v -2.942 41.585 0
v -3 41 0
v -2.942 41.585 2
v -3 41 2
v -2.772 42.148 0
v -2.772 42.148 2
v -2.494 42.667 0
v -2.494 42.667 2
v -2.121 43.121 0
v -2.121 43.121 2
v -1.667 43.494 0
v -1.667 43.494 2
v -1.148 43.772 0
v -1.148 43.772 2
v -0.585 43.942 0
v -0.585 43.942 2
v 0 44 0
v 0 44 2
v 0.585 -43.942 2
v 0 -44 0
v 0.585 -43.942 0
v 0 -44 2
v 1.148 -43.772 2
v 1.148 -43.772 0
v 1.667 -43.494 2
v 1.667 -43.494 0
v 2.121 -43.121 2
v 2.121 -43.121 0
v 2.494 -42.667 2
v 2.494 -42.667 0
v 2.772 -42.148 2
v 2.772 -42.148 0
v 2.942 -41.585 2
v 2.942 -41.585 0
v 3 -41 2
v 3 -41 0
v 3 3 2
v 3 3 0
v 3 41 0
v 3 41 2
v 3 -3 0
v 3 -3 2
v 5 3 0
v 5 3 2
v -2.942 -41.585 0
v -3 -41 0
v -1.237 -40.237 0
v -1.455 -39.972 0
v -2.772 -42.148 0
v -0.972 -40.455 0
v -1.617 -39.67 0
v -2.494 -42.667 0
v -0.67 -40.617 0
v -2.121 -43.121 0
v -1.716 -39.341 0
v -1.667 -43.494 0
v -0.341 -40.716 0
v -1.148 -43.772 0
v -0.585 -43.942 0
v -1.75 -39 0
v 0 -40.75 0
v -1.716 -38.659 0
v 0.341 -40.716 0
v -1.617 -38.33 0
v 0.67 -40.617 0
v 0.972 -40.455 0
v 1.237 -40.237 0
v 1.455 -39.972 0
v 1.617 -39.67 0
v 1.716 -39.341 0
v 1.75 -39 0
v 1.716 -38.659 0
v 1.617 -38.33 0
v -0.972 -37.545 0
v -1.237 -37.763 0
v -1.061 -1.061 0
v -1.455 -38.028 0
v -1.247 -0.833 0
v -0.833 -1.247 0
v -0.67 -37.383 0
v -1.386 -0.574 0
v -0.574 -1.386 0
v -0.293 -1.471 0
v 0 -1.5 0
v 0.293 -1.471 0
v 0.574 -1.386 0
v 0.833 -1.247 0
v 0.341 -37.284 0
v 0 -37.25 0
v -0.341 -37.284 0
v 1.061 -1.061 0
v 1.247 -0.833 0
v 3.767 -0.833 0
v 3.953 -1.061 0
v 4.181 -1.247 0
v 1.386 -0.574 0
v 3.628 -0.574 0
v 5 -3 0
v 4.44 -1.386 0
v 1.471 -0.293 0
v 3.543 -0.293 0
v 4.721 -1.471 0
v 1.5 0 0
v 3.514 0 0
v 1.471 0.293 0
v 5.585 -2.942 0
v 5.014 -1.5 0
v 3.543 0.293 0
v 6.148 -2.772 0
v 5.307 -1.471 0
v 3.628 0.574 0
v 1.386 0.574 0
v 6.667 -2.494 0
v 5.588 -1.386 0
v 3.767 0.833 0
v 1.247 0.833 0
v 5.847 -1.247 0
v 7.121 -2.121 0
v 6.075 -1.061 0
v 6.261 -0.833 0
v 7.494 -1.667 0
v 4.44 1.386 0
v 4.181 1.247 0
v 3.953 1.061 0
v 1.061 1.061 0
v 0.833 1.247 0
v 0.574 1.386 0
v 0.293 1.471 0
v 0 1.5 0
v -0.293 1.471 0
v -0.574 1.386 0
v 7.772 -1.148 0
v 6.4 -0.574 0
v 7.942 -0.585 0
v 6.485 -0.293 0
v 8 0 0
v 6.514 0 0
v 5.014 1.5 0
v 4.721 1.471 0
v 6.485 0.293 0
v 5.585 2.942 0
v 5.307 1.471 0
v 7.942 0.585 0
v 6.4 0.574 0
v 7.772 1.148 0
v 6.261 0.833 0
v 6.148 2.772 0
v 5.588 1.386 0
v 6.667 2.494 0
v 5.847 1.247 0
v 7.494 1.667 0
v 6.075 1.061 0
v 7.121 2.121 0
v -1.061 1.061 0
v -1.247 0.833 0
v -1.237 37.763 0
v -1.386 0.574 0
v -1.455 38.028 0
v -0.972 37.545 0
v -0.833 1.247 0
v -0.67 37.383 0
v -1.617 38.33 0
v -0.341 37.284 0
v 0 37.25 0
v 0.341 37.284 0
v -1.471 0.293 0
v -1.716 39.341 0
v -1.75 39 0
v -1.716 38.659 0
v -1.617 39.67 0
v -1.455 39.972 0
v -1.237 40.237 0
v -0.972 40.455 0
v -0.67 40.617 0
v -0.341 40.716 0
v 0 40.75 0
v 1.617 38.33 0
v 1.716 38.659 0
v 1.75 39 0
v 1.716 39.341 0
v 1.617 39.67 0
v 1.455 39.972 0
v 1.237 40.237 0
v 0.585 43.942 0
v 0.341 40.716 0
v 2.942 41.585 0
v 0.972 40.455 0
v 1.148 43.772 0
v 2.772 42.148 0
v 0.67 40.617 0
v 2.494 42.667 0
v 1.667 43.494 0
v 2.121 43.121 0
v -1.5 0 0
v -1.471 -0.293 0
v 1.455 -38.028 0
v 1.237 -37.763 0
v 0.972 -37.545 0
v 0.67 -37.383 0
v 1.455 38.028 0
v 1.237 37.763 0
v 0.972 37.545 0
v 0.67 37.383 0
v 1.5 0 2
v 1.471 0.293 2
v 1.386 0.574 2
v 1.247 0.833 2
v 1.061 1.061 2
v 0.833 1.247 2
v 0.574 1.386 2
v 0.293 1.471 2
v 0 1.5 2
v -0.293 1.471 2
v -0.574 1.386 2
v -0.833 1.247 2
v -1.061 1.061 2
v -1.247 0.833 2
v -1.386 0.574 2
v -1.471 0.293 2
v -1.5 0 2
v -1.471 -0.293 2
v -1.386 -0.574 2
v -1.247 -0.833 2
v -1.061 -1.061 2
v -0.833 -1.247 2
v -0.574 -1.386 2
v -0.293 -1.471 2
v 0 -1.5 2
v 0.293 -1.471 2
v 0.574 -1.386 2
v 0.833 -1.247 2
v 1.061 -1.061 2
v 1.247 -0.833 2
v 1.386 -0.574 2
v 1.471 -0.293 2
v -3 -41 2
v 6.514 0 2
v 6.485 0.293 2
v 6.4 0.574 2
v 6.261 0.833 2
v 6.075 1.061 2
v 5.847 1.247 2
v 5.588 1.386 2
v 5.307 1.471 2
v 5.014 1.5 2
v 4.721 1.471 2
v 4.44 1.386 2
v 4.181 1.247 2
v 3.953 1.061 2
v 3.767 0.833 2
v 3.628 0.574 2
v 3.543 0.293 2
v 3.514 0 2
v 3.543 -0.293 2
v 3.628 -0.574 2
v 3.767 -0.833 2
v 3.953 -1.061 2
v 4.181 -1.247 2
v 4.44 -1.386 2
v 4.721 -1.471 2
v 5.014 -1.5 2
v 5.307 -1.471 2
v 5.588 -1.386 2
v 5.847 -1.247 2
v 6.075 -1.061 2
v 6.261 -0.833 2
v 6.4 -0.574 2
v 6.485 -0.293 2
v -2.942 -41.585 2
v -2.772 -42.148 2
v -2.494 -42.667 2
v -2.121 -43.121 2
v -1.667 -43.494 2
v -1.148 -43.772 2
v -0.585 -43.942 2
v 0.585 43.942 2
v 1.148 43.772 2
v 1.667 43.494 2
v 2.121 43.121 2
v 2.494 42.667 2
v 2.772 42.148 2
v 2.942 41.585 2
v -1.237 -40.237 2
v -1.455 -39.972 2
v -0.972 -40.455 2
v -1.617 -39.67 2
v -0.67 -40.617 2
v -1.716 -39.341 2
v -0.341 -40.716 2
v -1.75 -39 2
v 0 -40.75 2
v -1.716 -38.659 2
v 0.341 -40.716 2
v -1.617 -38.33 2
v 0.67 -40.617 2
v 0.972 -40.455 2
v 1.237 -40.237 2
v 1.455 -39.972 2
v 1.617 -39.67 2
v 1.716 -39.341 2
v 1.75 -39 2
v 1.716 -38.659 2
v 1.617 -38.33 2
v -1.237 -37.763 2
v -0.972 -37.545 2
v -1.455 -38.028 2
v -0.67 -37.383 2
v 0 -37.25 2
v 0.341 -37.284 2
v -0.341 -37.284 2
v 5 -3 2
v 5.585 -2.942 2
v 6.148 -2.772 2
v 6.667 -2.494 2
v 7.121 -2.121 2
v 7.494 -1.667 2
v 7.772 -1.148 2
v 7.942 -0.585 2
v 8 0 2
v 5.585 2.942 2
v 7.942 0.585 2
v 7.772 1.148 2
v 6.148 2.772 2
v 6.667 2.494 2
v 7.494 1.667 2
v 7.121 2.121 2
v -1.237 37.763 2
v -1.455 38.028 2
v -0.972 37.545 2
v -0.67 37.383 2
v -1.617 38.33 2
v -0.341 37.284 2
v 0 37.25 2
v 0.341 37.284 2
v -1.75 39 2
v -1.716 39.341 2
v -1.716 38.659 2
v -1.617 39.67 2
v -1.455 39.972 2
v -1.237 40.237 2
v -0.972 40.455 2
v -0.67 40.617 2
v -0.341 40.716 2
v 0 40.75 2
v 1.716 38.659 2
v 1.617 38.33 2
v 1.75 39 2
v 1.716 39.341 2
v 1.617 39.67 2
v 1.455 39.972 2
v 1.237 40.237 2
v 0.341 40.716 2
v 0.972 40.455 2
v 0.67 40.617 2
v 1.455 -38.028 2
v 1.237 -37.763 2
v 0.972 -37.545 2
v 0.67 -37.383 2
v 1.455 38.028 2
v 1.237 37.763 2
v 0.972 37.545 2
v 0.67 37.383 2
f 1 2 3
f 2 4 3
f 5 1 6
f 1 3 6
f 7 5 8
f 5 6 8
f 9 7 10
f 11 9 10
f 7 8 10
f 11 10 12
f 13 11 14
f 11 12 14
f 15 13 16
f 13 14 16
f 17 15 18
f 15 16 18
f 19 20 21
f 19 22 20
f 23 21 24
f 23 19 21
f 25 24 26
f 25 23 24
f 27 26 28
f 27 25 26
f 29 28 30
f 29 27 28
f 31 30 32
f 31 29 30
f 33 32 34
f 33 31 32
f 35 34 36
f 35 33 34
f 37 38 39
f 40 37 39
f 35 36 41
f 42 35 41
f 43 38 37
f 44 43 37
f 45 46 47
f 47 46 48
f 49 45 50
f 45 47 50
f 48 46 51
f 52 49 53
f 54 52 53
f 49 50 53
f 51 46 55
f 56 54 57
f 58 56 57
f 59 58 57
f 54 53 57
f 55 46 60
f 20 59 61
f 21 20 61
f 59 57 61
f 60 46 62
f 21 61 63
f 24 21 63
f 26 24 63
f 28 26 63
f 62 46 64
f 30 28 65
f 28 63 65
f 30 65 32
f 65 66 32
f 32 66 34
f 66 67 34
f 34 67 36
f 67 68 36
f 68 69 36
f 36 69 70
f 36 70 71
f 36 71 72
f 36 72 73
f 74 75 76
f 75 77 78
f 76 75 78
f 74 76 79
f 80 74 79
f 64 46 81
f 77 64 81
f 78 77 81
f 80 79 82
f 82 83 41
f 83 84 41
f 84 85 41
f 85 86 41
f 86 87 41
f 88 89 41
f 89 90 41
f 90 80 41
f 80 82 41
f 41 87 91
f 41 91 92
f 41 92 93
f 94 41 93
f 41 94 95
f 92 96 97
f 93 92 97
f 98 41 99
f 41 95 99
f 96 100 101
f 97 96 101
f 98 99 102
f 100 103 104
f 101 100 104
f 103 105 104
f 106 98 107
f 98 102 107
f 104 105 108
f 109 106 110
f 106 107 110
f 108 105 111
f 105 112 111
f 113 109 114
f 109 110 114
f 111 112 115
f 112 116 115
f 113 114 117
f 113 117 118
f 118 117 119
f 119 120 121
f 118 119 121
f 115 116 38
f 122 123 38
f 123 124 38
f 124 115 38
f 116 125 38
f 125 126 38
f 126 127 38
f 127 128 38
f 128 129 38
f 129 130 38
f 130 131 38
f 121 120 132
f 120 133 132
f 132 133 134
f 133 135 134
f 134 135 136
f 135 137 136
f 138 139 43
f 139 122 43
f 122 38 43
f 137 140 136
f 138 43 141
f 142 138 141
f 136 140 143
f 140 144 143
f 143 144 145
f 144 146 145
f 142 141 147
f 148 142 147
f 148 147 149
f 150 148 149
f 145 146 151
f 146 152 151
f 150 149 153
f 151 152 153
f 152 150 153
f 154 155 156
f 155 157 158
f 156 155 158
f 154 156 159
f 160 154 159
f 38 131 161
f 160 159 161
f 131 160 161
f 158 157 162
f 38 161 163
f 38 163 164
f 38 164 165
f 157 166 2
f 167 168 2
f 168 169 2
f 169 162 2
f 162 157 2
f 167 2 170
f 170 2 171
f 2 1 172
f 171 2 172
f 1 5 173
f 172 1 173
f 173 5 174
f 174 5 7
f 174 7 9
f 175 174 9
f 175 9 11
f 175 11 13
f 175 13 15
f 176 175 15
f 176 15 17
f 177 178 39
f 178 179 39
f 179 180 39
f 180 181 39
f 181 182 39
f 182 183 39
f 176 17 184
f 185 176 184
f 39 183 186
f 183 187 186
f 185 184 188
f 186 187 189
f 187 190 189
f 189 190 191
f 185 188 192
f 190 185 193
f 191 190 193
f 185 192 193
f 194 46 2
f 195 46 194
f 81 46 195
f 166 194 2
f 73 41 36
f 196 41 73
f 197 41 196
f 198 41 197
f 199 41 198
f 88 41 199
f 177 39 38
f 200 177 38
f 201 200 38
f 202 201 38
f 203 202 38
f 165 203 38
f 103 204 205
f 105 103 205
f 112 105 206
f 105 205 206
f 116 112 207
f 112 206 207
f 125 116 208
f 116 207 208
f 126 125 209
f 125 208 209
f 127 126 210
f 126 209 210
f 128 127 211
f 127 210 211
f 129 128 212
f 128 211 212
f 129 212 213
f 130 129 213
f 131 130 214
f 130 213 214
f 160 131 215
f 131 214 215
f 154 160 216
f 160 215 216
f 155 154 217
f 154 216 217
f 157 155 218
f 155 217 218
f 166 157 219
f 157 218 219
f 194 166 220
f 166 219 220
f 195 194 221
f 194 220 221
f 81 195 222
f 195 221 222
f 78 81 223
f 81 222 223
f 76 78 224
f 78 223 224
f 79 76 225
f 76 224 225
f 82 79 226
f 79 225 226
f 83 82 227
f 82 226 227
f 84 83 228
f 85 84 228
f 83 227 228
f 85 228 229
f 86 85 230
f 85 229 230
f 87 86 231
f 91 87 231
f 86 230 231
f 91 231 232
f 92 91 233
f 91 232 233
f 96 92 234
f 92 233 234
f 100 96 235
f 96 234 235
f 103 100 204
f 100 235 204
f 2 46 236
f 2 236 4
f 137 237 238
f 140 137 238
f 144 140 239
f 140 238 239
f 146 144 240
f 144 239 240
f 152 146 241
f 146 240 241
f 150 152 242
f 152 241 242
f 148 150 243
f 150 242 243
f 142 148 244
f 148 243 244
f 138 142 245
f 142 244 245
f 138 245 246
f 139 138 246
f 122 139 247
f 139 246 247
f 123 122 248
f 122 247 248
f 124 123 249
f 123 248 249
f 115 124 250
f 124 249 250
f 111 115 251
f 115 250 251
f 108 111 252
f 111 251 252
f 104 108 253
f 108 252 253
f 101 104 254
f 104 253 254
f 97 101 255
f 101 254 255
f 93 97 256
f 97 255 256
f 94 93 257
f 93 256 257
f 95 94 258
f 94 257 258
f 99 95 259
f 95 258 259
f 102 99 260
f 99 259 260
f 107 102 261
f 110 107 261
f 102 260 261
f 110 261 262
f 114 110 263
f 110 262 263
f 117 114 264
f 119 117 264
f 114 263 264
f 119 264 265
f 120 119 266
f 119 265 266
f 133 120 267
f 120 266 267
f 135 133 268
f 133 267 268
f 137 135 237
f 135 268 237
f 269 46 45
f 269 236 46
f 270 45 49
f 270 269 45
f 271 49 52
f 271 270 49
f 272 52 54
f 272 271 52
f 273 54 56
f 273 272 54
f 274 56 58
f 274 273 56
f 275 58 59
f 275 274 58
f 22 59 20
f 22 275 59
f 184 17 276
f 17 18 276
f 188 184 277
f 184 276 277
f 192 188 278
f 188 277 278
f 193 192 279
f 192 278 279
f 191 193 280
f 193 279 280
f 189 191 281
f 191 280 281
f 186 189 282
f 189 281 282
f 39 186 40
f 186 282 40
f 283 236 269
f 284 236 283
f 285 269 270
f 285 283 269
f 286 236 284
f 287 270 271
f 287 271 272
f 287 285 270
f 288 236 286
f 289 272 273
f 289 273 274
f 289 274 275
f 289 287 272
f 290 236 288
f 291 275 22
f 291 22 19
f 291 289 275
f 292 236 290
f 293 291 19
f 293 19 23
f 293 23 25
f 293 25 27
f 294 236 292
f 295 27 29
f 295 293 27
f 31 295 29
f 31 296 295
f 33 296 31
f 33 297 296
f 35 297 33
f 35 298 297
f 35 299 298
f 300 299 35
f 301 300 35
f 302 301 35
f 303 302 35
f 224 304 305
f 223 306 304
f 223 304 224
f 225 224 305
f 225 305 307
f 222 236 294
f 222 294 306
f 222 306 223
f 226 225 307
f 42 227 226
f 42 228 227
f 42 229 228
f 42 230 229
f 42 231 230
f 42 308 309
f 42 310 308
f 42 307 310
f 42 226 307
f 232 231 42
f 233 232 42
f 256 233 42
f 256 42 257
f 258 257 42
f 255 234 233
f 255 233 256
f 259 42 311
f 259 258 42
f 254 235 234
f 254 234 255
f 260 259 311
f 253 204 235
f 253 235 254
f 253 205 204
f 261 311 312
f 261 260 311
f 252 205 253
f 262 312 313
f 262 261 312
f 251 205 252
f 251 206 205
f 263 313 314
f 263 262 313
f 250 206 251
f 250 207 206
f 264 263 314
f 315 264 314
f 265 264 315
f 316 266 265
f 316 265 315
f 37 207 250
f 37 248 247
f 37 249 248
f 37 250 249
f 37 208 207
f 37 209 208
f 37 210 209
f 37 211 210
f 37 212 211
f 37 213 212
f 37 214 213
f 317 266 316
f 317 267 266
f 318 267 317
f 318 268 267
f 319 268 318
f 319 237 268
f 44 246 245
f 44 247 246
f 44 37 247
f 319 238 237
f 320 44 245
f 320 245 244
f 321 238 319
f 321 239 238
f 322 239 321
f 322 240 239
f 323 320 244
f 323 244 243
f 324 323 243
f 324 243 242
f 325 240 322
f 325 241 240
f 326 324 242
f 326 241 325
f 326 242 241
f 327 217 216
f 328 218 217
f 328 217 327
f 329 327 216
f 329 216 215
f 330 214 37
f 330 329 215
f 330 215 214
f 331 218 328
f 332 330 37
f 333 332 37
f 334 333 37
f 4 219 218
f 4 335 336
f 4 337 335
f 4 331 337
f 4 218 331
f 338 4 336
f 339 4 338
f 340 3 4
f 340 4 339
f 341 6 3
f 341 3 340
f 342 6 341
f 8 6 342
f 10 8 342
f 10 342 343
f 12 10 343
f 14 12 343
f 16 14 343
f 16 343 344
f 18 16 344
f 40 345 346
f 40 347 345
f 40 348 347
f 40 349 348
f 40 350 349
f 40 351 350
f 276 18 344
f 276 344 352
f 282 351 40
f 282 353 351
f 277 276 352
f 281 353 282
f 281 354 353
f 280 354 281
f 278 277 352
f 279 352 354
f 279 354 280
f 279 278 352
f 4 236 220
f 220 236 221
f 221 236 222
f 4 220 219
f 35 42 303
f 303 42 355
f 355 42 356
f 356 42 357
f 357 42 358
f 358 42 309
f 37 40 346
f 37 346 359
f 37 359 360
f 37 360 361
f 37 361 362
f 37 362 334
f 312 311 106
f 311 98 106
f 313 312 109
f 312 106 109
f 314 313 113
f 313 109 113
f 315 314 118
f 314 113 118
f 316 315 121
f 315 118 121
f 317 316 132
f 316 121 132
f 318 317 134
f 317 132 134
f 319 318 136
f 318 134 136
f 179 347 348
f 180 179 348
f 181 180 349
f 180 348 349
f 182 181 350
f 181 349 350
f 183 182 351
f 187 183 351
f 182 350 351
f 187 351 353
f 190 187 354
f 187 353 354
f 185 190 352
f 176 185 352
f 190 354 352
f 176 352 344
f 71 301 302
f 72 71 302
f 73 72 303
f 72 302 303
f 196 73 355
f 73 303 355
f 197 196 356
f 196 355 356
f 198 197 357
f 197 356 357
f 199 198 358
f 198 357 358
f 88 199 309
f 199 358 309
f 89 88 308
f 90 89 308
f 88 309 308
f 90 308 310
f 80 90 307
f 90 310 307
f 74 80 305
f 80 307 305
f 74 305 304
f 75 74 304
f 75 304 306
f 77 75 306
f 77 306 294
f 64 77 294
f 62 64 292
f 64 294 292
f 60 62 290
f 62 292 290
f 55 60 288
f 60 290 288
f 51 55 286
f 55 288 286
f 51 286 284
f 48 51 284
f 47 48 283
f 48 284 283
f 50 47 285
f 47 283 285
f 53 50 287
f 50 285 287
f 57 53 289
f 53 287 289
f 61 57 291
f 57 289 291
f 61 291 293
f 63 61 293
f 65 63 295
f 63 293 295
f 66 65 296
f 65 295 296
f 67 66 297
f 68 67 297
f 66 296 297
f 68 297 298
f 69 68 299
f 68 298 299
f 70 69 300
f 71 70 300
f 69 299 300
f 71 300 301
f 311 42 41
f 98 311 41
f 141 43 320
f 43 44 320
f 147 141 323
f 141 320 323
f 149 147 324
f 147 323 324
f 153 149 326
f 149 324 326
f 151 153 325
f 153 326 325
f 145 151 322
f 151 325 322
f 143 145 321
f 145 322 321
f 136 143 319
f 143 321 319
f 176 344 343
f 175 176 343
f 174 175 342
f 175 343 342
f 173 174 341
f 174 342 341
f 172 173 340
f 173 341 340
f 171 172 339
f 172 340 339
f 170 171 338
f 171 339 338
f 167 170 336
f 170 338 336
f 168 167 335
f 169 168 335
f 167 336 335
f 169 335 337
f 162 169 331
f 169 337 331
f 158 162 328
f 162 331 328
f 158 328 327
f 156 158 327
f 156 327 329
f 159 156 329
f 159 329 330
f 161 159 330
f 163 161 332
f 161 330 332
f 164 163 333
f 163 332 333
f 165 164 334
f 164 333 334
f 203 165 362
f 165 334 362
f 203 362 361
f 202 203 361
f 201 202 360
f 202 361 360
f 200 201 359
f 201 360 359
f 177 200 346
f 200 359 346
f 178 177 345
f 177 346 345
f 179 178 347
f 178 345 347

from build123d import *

# Parameters (mm, degrees)
F0_W     = 6
F0_H     = 88
F1_DEPTH = 2
F2_R     = 1.5
F3_DEPTH = 2
F5_DEPTH = 5
F6_R     = 1.5
F7_DEPTH = 2
F8_R     = 2.99999


# Not quite as in the source:
# - a fillet or chamfer is up to 0.001 mm smaller than in the source, because OpenCascade refuses the exact size


with BuildPart() as f1:
    # F0 (on Top) → F1 (new body)
    with BuildSketch(Plane.XY):
        Rectangle(F0_W, F0_H)
    extrude(amount=F1_DEPTH)

    # F2 (on face) → F3 (cut, through all)
    with BuildSketch(Plane.XY.offset(2)):
        Circle(F2_R)
        with BuildLine():
            ThreePointArc((0, 40.75), (-1.2374368671, 37.7625631329), (1.75, 39))
            ThreePointArc((1.75, 39), (1.2374368671, 40.2374368671), (0, 40.75))
        make_face()
        with BuildLine():
            ThreePointArc((0, -40.75), (1.2374368671, -40.2374368671), (1.75, -39))
            ThreePointArc((1.75, -39), (-1.2374368671, -37.7625631329), (0, -40.75))
        make_face()
    extrude(amount=-F3_DEPTH, mode=Mode.SUBTRACT)

    # F4 (on face) → F5 (join)
    with BuildSketch(Plane.YZ.offset(3)):
        Polygon((3, 2), (0, 2), (-3, 2), (-3, 0), (0, 0), (3, 0), align=None)
    extrude(amount=F5_DEPTH)

    # F6 (on face) → F7 (cut, through all)
    with BuildSketch(Plane.XY.offset(2)):
        with Locations((5.0139404441, 0)):
            Circle(F6_R)
    extrude(amount=-F7_DEPTH, mode=Mode.SUBTRACT)

    # F8 (radius 3 in the source; OpenCascade refuses exactly that, so slightly less here)
    f8_edges = [f1.edges().sort_by_distance(p)[0] for p in [
        (-3, -44, 1),
        (3, -44, 1),
        (3, 44, 1),
        (-3, 44, 1),
        (8, -3, 1),
        (8, 3, 1),
    ]]
    fillet(f8_edges, radius=F8_R)


solid = f1.part
